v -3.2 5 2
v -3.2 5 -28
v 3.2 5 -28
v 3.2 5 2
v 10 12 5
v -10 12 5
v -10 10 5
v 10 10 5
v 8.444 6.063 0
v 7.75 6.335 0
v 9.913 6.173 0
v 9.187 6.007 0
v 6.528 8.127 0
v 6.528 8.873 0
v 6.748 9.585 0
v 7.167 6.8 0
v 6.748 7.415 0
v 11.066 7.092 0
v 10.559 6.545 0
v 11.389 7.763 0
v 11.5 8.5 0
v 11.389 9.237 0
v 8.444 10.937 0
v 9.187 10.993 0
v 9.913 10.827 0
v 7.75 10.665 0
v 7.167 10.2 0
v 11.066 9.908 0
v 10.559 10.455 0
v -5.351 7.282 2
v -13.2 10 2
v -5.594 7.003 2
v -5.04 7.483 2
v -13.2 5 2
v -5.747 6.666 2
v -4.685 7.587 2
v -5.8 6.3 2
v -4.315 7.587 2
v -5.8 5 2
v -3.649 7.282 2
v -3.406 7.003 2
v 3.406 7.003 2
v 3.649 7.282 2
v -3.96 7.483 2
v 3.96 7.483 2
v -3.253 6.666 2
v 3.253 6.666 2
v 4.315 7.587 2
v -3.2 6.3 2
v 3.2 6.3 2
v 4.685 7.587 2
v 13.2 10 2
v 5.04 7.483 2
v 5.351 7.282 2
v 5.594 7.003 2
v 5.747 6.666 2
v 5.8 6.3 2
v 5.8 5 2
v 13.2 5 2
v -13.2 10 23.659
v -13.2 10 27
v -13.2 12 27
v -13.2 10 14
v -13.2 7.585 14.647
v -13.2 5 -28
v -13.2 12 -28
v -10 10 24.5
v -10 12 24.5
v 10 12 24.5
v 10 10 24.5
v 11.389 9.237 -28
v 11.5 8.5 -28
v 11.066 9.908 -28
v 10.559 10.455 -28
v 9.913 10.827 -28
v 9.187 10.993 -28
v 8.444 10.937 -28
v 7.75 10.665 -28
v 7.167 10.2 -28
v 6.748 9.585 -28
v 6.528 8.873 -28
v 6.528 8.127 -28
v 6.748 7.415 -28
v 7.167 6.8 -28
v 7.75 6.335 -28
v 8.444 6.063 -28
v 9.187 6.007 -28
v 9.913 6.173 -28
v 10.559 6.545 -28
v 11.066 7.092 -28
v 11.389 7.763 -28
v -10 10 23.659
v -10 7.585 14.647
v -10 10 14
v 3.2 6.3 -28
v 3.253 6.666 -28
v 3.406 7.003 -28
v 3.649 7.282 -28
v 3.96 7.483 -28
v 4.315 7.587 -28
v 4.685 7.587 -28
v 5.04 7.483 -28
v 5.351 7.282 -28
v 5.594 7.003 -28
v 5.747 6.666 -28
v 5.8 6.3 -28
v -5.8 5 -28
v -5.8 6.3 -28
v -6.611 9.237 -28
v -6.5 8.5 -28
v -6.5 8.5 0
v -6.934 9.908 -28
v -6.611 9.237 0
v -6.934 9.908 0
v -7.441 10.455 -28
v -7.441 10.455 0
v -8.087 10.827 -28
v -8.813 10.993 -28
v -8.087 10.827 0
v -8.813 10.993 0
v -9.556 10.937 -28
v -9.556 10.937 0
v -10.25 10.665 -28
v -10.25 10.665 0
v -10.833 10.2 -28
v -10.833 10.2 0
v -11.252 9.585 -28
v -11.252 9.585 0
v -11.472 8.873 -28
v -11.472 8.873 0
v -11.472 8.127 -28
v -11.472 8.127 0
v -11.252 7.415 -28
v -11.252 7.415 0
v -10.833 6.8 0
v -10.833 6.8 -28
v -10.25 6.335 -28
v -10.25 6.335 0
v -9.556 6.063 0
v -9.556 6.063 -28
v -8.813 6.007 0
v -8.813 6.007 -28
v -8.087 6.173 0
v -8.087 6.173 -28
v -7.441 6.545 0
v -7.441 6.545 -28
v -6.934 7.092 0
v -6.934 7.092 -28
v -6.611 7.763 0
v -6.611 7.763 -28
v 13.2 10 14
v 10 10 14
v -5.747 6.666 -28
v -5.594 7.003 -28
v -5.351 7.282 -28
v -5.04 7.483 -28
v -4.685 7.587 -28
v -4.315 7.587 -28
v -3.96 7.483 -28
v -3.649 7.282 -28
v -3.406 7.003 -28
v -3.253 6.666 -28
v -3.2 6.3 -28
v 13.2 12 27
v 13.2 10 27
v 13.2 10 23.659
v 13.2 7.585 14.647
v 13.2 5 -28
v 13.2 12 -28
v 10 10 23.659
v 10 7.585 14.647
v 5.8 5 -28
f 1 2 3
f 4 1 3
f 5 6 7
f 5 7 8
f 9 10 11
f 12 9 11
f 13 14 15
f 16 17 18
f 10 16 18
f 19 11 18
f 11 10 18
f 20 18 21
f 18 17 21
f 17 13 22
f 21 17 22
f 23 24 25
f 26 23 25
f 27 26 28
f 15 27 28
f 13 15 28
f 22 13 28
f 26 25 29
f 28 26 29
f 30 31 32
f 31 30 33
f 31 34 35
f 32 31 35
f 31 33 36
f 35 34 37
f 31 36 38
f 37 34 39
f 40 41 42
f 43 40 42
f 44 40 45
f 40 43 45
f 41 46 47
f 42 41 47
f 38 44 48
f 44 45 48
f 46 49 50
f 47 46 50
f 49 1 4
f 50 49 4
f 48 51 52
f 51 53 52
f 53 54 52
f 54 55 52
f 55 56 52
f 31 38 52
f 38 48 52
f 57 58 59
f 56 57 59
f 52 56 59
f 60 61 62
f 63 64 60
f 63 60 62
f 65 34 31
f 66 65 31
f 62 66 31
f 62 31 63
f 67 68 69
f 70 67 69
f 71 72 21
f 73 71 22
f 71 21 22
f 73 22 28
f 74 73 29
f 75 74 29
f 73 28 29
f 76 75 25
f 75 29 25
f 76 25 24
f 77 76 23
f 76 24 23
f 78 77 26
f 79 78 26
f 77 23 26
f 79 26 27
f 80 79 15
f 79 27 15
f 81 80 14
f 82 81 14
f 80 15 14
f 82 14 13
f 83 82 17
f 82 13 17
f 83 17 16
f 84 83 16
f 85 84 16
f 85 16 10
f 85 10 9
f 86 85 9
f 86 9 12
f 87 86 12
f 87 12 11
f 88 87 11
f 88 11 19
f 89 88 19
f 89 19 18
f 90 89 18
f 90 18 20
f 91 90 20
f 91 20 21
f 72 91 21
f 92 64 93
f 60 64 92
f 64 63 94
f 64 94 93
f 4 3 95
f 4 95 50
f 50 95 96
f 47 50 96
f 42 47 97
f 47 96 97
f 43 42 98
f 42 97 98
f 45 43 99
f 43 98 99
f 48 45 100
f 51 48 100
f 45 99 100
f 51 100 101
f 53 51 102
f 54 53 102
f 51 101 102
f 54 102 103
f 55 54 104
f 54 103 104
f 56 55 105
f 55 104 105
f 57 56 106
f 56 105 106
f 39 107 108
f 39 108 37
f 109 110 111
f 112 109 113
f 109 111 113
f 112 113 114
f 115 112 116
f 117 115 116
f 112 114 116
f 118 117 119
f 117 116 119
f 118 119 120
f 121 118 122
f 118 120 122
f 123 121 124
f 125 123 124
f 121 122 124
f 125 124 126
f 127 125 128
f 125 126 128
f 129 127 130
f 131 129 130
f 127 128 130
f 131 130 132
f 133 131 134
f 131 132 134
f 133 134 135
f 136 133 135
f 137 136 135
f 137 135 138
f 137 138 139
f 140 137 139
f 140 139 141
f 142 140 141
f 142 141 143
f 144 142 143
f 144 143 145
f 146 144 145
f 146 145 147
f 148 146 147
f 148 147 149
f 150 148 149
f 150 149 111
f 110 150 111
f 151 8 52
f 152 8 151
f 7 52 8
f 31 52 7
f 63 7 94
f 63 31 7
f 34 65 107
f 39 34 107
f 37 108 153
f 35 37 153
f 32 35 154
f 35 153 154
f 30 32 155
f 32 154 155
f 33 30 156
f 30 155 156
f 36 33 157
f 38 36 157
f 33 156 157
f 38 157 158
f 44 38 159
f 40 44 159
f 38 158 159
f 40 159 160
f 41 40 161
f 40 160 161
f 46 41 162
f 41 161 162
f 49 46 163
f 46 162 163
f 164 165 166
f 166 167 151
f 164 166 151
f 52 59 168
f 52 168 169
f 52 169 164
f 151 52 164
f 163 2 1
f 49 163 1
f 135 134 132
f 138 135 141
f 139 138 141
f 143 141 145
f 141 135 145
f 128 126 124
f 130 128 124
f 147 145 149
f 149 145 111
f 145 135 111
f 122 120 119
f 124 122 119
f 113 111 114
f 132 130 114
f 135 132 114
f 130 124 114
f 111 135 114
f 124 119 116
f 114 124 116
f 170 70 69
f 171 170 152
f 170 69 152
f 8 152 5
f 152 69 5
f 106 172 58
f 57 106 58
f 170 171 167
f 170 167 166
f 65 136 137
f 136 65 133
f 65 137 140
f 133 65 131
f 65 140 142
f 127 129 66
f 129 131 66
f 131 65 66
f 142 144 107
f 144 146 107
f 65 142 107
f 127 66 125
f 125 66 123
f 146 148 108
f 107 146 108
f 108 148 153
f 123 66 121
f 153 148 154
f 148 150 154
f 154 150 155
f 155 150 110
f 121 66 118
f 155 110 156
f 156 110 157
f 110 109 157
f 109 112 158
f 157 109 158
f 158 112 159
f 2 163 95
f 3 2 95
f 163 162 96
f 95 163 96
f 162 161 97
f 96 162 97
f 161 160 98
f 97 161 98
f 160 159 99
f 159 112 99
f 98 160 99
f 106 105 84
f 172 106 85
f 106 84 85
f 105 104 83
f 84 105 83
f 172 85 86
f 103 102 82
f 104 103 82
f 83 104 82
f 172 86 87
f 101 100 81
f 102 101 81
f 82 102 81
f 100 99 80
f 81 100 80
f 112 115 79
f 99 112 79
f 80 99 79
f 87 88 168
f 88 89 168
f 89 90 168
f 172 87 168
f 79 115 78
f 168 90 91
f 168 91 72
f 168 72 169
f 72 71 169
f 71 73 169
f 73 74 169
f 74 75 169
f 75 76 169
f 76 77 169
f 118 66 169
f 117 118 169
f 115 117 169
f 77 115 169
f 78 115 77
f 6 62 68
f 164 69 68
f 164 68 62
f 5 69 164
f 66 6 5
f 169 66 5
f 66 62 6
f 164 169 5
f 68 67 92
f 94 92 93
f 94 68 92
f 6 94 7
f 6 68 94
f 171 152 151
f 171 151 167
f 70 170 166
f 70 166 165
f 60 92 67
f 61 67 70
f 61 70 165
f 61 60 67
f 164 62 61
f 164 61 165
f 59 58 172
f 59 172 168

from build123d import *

# Parameters (mm, degrees)
SKETCH1_W           = 63.5
SKETCH1_H           = 35
BOSS_EXTRUDE1_DEPTH = 12
SKETCH3_W           = 26.4
SKETCH3_H           = 35
CUT_EXTRUDE2_DEPTH  = 5
SKETCH4_W           = 2.6
SKETCH4_H           = 35
CUT_EXTRUDE3_DEPTH  = 1.3
SKETCH5_W           = 18.55
SKETCH5_H           = 35
CUT_EXTRUDE4_DEPTH  = 13
SKETCH6_W           = 18.55
SKETCH6_H           = 35
CUT_EXTRUDE5_DEPTH  = 13
SKETCH7_R           = 2.5
CUT_EXTRUDE6_DEPTH  = 36
SKETCH8_R           = 2.5
CUT_EXTRUDE7_DEPTH  = 36
SKETCH12_W          = 26.4
SKETCH12_H          = 10
BOSS_EXTRUDE2_DEPTH = 27
SKETCH13_W          = 20
SKETCH13_H          = 19.5
CUT_EXTRUDE8_DEPTH  = 11
SKETCH14_W          = 27
SKETCH14_H          = 3
CUT_EXTRUDE9_DEPTH  = 27.4
SKETCH18_W          = 2.6
SKETCH18_H          = 1.3
CUT_EXTRUDE12_DEPTH = 28
SKETCH19_W          = 10
SKETCH19_H          = 5
CUT_EXTRUDE13_DEPTH = 27.4
SKETCH20_W          = 2.5
SKETCH20_H          = 5
CUT_EXTRUDE14_DEPTH = 27.4
CUT_EXTRUDE15_DEPTH = 27.4
SKETCH24_W          = 26.4
SKETCH24_H          = 2
CUT_EXTRUDE18_DEPTH = 5
SKETCH25_W          = 26.4
SKETCH25_H          = 7
CUT_EXTRUDE19_DEPTH = 8
SKETCH26_R          = 1.3
CUT_EXTRUDE20_DEPTH = 56


with BuildPart() as part:
    # Sketch1 → Boss-Extrude1 (new body)
    with BuildSketch(Plane(origin=(0, 0, 0), x_dir=(1, 0, 0), z_dir=(0, 1, 0))):
        with Locations((0, 17.5)):
            Rectangle(SKETCH1_W, SKETCH1_H)
    extrude(amount=BOSS_EXTRUDE1_DEPTH)

    # Sketch3 → Cut-Extrude2 (cut)
    with BuildSketch(Plane.XZ):
        with Locations((0, -17.5)):
            Rectangle(SKETCH3_W, SKETCH3_H)
    extrude(amount=-CUT_EXTRUDE2_DEPTH, mode=Mode.SUBTRACT)

    # Sketch4 → Cut-Extrude3 (cut)
    with BuildSketch(Plane.XZ.offset(-5)):
        with Locations((-4.5, -17.5)):
            Rectangle(SKETCH4_W, SKETCH4_H)
        with Locations((4.5, -17.5)):
            Rectangle(SKETCH4_W, SKETCH4_H)
    extrude(amount=-CUT_EXTRUDE3_DEPTH, mode=Mode.SUBTRACT)

    # Sketch5 → Cut-Extrude4 (cut, through all)
    with BuildSketch(Plane.XZ):
        with Locations((-22.475, -17.5)):
            Rectangle(SKETCH5_W, SKETCH5_H)
    extrude(amount=-CUT_EXTRUDE4_DEPTH, mode=Mode.SUBTRACT)

    # Sketch6 → Cut-Extrude5 (cut, through all)
    with BuildSketch(Plane.XZ):
        with Locations((22.475, -17.5)):
            Rectangle(SKETCH6_W, SKETCH6_H)
    extrude(amount=-CUT_EXTRUDE5_DEPTH, mode=Mode.SUBTRACT)

    # Sketch7 → Cut-Extrude6 (cut, through all)
    with BuildSketch(Plane.XY):
        with Locations((-9, 8.5)):
            Circle(SKETCH7_R)
    extrude(amount=-CUT_EXTRUDE6_DEPTH, mode=Mode.SUBTRACT)

    # Sketch8 → Cut-Extrude7 (cut, through all)
    with BuildSketch(Plane.XY):
        with Locations((9, 8.5)):
            Circle(SKETCH8_R)
    extrude(amount=-CUT_EXTRUDE7_DEPTH, mode=Mode.SUBTRACT)

    # Sketch12 → Boss-Extrude2 (add)
    with BuildSketch(Plane.XY):
        with Locations((0, 10)):
            Rectangle(SKETCH12_W, SKETCH12_H)
    extrude(amount=BOSS_EXTRUDE2_DEPTH)

    # Sketch13 → Cut-Extrude8 (cut, through all)
    with BuildSketch(Plane(origin=(0, 15, 0), x_dir=(1, 0, 0), z_dir=(0, 1, 0))):
        with Locations((0, -14.75)):
            Rectangle(SKETCH13_W, SKETCH13_H)
    extrude(amount=-CUT_EXTRUDE8_DEPTH, mode=Mode.SUBTRACT)

    # Sketch14 → Cut-Extrude9 (cut, through all)
    with BuildSketch(Plane.ZY.offset(13.2)):
        with Locations((13.5, 13.5)):
            Rectangle(SKETCH14_W, SKETCH14_H)
    extrude(amount=-CUT_EXTRUDE9_DEPTH, mode=Mode.SUBTRACT)

    # Sketch18 → Cut-Extrude12 (cut, through all)
    with BuildSketch(Plane(origin=(0, 0, 0), x_dir=(-1, 0, 0), z_dir=(0, 0, -1))):
        with Locations((4.5, 5.65)):
            Rectangle(SKETCH18_W, SKETCH18_H)
        with Locations((-4.5, 5.65)):
            Rectangle(SKETCH18_W, SKETCH18_H)
    extrude(amount=-CUT_EXTRUDE12_DEPTH, mode=Mode.SUBTRACT)

    # Sketch19 → Cut-Extrude13 (cut, through all)
    with BuildSketch(Plane.ZY.offset(13.2)):
        with Locations((9, 7.5)):
            Rectangle(SKETCH19_W, SKETCH19_H)
    extrude(amount=-CUT_EXTRUDE13_DEPTH, mode=Mode.SUBTRACT)

    # Sketch20 → Cut-Extrude14 (cut, through all)
    with BuildSketch(Plane.ZY.offset(13.2)):
        with Locations((25.75, 7.5)):
            Rectangle(SKETCH20_W, SKETCH20_H)
    extrude(amount=-CUT_EXTRUDE14_DEPTH, mode=Mode.SUBTRACT)

    # Sketch21 → Cut-Extrude15 (cut, through all)
    with BuildSketch(Plane.ZY.offset(13.2)):
        Polygon((14, 10), (14.647047613, 7.585185434), (23.6593, 10), (24.5, 10), (24.5, 5), (14, 5), align=None)
    extrude(amount=-CUT_EXTRUDE15_DEPTH, mode=Mode.SUBTRACT)

    # Sketch24 → Cut-Extrude18 (cut)
    with BuildSketch(Plane.XZ.offset(-5)):
        with Locations((0, 3)):
            Rectangle(SKETCH24_W, SKETCH24_H)
    extrude(amount=-CUT_EXTRUDE18_DEPTH, mode=Mode.SUBTRACT)

    # Sketch25 → Cut-Extrude19 (cut, through all)
    with BuildSketch(Plane(origin=(0, 12, 0), x_dir=(1, 0, 0), z_dir=(0, 1, 0))):
        with Locations((0, 31.5)):
            Rectangle(SKETCH25_W, SKETCH25_H)
    extrude(amount=-CUT_EXTRUDE19_DEPTH, mode=Mode.SUBTRACT)

    # Sketch26 → Cut-Extrude20 (cut, through all)
    with BuildSketch(Plane(origin=(0, 0, -28), x_dir=(-1, 0, 0), z_dir=(0, 0, -1))):
        with Locations((4.5, 6.3)):
            Circle(SKETCH26_R)
        with Locations((-4.5, 6.3)):
            Circle(SKETCH26_R)
    extrude(amount=-CUT_EXTRUDE20_DEPTH, mode=Mode.SUBTRACT)


solid = part.part
